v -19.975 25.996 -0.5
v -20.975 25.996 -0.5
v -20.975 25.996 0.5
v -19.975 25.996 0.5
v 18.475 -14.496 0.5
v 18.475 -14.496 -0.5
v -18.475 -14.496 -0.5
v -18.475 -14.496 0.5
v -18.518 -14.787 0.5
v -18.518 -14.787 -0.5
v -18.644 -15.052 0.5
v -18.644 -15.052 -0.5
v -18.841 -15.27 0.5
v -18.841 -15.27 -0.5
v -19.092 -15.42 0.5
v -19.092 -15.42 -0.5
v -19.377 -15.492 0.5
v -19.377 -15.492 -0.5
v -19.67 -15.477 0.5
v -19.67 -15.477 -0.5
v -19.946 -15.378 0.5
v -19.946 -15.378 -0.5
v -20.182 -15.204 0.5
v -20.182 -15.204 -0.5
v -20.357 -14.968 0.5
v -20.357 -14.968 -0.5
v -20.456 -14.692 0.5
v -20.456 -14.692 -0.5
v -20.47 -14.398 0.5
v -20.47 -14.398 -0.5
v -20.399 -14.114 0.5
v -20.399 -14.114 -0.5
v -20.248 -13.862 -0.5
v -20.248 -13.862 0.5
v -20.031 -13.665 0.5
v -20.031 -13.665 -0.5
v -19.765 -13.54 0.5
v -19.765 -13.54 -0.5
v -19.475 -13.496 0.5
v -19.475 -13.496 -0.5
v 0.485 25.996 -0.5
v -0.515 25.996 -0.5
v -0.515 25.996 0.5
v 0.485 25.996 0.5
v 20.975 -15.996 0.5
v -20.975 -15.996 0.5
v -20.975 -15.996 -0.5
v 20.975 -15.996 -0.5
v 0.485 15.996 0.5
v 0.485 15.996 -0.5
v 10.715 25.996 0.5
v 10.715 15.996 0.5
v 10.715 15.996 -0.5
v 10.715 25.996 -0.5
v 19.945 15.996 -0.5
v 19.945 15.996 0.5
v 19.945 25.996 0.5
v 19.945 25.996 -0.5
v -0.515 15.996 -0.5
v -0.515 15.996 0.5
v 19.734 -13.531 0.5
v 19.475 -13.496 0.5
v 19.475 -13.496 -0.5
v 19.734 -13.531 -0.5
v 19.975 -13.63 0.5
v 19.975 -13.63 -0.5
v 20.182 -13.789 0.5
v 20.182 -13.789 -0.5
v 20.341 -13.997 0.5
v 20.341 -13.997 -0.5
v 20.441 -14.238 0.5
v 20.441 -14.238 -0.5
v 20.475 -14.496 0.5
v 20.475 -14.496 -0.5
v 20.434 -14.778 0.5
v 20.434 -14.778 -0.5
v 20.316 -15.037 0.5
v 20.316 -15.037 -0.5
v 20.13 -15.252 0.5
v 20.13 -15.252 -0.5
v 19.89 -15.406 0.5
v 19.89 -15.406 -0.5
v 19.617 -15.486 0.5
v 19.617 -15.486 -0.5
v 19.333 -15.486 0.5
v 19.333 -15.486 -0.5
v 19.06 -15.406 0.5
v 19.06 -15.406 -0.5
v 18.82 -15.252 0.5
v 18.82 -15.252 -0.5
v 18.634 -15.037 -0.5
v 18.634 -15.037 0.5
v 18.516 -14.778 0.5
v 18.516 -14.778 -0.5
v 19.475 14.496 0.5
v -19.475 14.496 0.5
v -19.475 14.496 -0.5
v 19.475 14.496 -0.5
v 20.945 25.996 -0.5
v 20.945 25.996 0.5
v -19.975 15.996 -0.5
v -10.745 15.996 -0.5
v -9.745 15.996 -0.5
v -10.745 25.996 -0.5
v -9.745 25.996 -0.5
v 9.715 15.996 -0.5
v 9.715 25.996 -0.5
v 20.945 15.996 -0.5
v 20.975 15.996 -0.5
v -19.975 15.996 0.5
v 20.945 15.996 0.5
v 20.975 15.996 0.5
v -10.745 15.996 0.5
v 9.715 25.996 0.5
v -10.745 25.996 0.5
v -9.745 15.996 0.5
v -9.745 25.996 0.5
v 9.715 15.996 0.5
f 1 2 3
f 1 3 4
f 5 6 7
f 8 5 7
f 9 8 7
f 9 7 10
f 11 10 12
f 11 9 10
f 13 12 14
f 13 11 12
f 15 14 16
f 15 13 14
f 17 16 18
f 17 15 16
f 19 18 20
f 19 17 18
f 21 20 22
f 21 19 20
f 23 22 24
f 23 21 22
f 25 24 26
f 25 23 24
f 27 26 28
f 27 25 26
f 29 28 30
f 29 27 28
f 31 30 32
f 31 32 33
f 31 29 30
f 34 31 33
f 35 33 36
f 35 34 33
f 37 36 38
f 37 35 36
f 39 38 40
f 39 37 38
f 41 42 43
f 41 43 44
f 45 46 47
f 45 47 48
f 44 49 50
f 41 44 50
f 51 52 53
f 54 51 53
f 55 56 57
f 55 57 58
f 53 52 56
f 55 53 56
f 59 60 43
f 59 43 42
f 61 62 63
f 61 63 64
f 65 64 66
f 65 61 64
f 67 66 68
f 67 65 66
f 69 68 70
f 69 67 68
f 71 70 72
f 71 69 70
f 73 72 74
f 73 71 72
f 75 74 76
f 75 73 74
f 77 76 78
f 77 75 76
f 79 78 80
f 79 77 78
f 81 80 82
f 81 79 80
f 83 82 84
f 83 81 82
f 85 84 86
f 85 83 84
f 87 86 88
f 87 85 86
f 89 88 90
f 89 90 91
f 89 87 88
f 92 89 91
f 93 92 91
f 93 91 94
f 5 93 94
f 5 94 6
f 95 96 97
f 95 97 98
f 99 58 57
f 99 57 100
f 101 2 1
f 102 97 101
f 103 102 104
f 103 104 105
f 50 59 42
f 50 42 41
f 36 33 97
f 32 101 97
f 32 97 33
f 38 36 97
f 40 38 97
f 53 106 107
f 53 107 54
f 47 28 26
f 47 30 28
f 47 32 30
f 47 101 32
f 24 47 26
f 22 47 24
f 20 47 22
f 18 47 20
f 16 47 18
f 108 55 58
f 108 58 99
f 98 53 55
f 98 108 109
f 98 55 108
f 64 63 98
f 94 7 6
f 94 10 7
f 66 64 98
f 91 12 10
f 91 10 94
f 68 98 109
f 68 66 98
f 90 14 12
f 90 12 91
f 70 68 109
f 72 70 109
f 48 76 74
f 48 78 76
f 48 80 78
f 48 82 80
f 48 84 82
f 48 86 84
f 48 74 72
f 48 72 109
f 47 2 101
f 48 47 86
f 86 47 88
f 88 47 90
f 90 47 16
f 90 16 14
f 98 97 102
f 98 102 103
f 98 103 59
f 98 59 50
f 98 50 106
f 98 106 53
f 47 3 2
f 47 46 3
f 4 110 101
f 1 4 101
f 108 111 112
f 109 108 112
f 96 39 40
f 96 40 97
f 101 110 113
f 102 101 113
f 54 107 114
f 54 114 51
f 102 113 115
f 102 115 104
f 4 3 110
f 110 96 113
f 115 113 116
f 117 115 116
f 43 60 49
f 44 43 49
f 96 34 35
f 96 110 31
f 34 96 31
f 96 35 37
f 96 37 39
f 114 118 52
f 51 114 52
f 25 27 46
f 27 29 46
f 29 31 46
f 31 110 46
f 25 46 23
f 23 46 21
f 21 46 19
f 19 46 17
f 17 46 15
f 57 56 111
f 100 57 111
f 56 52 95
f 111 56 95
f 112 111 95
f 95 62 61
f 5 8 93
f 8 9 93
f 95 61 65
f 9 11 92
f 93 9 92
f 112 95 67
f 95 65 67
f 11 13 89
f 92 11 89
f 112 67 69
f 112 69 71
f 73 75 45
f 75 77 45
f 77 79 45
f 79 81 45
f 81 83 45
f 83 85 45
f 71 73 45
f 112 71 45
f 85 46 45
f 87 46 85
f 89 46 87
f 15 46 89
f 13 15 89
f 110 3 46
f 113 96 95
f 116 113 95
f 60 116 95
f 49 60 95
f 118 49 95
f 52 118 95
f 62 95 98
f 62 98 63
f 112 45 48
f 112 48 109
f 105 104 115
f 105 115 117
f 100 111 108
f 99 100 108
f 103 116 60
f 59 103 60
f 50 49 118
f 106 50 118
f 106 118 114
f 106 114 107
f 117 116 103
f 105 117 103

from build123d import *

# Parameters (mm, degrees)
SKETCH1_W           = 41.95
SKETCH1_H           = 31.993
BOSS_EXTRUDE1_DEPTH = 0.5
SKETCH2_W           = 1
SKETCH2_H           = 1
BOSS_EXTRUDE2_DEPTH = 10
LPATTERN1_COUNT     = 5
LPATTERN1_PITCH     = 10.23


with BuildPart() as part:
    # Sketch1 → Boss-Extrude1 (new, symmetric)
    with BuildSketch(Plane.XY):
        Rectangle(SKETCH1_W, SKETCH1_H)
        with BuildLine():
            Line((18.475, -14.4965), (-18.475, -14.4965))
            ThreePointArc((-18.475, -14.4965), (-20.182106781, -15.203606781), (-19.475, -13.4965))
            Line((-19.475, -13.4965), (-19.475, 14.4965))
            Line((-19.475, 14.4965), (19.475, 14.4965))
            Line((19.475, 14.4965), (19.475, -13.4965))
            ThreePointArc((19.475, -13.4965), (20.182106781, -13.789393219), (20.475, -14.4965))
            ThreePointArc((20.475, -14.4965), (19.475, -15.4965), (18.475, -14.4965))
        make_face(mode=Mode.SUBTRACT)
    extrude(amount=BOSS_EXTRUDE1_DEPTH, both=True)

    # Sketch2 → Boss-Extrude2 (add)
    with BuildSketch(Plane(origin=(0, 15.9965, 0), x_dir=(1, 0, 0), z_dir=(0, 1, 0))):
        with Locations((-20.475, 0)):
            Rectangle(SKETCH2_W, SKETCH2_H)
    boss_extrude2 = extrude(amount=BOSS_EXTRUDE2_DEPTH)

    # LPattern1: Boss-Extrude2 ×5
    with Locations(*[(i * LPATTERN1_PITCH, 0, 0) for i in range(1, LPATTERN1_COUNT)]):
        add(boss_extrude2)


solid = part.part
